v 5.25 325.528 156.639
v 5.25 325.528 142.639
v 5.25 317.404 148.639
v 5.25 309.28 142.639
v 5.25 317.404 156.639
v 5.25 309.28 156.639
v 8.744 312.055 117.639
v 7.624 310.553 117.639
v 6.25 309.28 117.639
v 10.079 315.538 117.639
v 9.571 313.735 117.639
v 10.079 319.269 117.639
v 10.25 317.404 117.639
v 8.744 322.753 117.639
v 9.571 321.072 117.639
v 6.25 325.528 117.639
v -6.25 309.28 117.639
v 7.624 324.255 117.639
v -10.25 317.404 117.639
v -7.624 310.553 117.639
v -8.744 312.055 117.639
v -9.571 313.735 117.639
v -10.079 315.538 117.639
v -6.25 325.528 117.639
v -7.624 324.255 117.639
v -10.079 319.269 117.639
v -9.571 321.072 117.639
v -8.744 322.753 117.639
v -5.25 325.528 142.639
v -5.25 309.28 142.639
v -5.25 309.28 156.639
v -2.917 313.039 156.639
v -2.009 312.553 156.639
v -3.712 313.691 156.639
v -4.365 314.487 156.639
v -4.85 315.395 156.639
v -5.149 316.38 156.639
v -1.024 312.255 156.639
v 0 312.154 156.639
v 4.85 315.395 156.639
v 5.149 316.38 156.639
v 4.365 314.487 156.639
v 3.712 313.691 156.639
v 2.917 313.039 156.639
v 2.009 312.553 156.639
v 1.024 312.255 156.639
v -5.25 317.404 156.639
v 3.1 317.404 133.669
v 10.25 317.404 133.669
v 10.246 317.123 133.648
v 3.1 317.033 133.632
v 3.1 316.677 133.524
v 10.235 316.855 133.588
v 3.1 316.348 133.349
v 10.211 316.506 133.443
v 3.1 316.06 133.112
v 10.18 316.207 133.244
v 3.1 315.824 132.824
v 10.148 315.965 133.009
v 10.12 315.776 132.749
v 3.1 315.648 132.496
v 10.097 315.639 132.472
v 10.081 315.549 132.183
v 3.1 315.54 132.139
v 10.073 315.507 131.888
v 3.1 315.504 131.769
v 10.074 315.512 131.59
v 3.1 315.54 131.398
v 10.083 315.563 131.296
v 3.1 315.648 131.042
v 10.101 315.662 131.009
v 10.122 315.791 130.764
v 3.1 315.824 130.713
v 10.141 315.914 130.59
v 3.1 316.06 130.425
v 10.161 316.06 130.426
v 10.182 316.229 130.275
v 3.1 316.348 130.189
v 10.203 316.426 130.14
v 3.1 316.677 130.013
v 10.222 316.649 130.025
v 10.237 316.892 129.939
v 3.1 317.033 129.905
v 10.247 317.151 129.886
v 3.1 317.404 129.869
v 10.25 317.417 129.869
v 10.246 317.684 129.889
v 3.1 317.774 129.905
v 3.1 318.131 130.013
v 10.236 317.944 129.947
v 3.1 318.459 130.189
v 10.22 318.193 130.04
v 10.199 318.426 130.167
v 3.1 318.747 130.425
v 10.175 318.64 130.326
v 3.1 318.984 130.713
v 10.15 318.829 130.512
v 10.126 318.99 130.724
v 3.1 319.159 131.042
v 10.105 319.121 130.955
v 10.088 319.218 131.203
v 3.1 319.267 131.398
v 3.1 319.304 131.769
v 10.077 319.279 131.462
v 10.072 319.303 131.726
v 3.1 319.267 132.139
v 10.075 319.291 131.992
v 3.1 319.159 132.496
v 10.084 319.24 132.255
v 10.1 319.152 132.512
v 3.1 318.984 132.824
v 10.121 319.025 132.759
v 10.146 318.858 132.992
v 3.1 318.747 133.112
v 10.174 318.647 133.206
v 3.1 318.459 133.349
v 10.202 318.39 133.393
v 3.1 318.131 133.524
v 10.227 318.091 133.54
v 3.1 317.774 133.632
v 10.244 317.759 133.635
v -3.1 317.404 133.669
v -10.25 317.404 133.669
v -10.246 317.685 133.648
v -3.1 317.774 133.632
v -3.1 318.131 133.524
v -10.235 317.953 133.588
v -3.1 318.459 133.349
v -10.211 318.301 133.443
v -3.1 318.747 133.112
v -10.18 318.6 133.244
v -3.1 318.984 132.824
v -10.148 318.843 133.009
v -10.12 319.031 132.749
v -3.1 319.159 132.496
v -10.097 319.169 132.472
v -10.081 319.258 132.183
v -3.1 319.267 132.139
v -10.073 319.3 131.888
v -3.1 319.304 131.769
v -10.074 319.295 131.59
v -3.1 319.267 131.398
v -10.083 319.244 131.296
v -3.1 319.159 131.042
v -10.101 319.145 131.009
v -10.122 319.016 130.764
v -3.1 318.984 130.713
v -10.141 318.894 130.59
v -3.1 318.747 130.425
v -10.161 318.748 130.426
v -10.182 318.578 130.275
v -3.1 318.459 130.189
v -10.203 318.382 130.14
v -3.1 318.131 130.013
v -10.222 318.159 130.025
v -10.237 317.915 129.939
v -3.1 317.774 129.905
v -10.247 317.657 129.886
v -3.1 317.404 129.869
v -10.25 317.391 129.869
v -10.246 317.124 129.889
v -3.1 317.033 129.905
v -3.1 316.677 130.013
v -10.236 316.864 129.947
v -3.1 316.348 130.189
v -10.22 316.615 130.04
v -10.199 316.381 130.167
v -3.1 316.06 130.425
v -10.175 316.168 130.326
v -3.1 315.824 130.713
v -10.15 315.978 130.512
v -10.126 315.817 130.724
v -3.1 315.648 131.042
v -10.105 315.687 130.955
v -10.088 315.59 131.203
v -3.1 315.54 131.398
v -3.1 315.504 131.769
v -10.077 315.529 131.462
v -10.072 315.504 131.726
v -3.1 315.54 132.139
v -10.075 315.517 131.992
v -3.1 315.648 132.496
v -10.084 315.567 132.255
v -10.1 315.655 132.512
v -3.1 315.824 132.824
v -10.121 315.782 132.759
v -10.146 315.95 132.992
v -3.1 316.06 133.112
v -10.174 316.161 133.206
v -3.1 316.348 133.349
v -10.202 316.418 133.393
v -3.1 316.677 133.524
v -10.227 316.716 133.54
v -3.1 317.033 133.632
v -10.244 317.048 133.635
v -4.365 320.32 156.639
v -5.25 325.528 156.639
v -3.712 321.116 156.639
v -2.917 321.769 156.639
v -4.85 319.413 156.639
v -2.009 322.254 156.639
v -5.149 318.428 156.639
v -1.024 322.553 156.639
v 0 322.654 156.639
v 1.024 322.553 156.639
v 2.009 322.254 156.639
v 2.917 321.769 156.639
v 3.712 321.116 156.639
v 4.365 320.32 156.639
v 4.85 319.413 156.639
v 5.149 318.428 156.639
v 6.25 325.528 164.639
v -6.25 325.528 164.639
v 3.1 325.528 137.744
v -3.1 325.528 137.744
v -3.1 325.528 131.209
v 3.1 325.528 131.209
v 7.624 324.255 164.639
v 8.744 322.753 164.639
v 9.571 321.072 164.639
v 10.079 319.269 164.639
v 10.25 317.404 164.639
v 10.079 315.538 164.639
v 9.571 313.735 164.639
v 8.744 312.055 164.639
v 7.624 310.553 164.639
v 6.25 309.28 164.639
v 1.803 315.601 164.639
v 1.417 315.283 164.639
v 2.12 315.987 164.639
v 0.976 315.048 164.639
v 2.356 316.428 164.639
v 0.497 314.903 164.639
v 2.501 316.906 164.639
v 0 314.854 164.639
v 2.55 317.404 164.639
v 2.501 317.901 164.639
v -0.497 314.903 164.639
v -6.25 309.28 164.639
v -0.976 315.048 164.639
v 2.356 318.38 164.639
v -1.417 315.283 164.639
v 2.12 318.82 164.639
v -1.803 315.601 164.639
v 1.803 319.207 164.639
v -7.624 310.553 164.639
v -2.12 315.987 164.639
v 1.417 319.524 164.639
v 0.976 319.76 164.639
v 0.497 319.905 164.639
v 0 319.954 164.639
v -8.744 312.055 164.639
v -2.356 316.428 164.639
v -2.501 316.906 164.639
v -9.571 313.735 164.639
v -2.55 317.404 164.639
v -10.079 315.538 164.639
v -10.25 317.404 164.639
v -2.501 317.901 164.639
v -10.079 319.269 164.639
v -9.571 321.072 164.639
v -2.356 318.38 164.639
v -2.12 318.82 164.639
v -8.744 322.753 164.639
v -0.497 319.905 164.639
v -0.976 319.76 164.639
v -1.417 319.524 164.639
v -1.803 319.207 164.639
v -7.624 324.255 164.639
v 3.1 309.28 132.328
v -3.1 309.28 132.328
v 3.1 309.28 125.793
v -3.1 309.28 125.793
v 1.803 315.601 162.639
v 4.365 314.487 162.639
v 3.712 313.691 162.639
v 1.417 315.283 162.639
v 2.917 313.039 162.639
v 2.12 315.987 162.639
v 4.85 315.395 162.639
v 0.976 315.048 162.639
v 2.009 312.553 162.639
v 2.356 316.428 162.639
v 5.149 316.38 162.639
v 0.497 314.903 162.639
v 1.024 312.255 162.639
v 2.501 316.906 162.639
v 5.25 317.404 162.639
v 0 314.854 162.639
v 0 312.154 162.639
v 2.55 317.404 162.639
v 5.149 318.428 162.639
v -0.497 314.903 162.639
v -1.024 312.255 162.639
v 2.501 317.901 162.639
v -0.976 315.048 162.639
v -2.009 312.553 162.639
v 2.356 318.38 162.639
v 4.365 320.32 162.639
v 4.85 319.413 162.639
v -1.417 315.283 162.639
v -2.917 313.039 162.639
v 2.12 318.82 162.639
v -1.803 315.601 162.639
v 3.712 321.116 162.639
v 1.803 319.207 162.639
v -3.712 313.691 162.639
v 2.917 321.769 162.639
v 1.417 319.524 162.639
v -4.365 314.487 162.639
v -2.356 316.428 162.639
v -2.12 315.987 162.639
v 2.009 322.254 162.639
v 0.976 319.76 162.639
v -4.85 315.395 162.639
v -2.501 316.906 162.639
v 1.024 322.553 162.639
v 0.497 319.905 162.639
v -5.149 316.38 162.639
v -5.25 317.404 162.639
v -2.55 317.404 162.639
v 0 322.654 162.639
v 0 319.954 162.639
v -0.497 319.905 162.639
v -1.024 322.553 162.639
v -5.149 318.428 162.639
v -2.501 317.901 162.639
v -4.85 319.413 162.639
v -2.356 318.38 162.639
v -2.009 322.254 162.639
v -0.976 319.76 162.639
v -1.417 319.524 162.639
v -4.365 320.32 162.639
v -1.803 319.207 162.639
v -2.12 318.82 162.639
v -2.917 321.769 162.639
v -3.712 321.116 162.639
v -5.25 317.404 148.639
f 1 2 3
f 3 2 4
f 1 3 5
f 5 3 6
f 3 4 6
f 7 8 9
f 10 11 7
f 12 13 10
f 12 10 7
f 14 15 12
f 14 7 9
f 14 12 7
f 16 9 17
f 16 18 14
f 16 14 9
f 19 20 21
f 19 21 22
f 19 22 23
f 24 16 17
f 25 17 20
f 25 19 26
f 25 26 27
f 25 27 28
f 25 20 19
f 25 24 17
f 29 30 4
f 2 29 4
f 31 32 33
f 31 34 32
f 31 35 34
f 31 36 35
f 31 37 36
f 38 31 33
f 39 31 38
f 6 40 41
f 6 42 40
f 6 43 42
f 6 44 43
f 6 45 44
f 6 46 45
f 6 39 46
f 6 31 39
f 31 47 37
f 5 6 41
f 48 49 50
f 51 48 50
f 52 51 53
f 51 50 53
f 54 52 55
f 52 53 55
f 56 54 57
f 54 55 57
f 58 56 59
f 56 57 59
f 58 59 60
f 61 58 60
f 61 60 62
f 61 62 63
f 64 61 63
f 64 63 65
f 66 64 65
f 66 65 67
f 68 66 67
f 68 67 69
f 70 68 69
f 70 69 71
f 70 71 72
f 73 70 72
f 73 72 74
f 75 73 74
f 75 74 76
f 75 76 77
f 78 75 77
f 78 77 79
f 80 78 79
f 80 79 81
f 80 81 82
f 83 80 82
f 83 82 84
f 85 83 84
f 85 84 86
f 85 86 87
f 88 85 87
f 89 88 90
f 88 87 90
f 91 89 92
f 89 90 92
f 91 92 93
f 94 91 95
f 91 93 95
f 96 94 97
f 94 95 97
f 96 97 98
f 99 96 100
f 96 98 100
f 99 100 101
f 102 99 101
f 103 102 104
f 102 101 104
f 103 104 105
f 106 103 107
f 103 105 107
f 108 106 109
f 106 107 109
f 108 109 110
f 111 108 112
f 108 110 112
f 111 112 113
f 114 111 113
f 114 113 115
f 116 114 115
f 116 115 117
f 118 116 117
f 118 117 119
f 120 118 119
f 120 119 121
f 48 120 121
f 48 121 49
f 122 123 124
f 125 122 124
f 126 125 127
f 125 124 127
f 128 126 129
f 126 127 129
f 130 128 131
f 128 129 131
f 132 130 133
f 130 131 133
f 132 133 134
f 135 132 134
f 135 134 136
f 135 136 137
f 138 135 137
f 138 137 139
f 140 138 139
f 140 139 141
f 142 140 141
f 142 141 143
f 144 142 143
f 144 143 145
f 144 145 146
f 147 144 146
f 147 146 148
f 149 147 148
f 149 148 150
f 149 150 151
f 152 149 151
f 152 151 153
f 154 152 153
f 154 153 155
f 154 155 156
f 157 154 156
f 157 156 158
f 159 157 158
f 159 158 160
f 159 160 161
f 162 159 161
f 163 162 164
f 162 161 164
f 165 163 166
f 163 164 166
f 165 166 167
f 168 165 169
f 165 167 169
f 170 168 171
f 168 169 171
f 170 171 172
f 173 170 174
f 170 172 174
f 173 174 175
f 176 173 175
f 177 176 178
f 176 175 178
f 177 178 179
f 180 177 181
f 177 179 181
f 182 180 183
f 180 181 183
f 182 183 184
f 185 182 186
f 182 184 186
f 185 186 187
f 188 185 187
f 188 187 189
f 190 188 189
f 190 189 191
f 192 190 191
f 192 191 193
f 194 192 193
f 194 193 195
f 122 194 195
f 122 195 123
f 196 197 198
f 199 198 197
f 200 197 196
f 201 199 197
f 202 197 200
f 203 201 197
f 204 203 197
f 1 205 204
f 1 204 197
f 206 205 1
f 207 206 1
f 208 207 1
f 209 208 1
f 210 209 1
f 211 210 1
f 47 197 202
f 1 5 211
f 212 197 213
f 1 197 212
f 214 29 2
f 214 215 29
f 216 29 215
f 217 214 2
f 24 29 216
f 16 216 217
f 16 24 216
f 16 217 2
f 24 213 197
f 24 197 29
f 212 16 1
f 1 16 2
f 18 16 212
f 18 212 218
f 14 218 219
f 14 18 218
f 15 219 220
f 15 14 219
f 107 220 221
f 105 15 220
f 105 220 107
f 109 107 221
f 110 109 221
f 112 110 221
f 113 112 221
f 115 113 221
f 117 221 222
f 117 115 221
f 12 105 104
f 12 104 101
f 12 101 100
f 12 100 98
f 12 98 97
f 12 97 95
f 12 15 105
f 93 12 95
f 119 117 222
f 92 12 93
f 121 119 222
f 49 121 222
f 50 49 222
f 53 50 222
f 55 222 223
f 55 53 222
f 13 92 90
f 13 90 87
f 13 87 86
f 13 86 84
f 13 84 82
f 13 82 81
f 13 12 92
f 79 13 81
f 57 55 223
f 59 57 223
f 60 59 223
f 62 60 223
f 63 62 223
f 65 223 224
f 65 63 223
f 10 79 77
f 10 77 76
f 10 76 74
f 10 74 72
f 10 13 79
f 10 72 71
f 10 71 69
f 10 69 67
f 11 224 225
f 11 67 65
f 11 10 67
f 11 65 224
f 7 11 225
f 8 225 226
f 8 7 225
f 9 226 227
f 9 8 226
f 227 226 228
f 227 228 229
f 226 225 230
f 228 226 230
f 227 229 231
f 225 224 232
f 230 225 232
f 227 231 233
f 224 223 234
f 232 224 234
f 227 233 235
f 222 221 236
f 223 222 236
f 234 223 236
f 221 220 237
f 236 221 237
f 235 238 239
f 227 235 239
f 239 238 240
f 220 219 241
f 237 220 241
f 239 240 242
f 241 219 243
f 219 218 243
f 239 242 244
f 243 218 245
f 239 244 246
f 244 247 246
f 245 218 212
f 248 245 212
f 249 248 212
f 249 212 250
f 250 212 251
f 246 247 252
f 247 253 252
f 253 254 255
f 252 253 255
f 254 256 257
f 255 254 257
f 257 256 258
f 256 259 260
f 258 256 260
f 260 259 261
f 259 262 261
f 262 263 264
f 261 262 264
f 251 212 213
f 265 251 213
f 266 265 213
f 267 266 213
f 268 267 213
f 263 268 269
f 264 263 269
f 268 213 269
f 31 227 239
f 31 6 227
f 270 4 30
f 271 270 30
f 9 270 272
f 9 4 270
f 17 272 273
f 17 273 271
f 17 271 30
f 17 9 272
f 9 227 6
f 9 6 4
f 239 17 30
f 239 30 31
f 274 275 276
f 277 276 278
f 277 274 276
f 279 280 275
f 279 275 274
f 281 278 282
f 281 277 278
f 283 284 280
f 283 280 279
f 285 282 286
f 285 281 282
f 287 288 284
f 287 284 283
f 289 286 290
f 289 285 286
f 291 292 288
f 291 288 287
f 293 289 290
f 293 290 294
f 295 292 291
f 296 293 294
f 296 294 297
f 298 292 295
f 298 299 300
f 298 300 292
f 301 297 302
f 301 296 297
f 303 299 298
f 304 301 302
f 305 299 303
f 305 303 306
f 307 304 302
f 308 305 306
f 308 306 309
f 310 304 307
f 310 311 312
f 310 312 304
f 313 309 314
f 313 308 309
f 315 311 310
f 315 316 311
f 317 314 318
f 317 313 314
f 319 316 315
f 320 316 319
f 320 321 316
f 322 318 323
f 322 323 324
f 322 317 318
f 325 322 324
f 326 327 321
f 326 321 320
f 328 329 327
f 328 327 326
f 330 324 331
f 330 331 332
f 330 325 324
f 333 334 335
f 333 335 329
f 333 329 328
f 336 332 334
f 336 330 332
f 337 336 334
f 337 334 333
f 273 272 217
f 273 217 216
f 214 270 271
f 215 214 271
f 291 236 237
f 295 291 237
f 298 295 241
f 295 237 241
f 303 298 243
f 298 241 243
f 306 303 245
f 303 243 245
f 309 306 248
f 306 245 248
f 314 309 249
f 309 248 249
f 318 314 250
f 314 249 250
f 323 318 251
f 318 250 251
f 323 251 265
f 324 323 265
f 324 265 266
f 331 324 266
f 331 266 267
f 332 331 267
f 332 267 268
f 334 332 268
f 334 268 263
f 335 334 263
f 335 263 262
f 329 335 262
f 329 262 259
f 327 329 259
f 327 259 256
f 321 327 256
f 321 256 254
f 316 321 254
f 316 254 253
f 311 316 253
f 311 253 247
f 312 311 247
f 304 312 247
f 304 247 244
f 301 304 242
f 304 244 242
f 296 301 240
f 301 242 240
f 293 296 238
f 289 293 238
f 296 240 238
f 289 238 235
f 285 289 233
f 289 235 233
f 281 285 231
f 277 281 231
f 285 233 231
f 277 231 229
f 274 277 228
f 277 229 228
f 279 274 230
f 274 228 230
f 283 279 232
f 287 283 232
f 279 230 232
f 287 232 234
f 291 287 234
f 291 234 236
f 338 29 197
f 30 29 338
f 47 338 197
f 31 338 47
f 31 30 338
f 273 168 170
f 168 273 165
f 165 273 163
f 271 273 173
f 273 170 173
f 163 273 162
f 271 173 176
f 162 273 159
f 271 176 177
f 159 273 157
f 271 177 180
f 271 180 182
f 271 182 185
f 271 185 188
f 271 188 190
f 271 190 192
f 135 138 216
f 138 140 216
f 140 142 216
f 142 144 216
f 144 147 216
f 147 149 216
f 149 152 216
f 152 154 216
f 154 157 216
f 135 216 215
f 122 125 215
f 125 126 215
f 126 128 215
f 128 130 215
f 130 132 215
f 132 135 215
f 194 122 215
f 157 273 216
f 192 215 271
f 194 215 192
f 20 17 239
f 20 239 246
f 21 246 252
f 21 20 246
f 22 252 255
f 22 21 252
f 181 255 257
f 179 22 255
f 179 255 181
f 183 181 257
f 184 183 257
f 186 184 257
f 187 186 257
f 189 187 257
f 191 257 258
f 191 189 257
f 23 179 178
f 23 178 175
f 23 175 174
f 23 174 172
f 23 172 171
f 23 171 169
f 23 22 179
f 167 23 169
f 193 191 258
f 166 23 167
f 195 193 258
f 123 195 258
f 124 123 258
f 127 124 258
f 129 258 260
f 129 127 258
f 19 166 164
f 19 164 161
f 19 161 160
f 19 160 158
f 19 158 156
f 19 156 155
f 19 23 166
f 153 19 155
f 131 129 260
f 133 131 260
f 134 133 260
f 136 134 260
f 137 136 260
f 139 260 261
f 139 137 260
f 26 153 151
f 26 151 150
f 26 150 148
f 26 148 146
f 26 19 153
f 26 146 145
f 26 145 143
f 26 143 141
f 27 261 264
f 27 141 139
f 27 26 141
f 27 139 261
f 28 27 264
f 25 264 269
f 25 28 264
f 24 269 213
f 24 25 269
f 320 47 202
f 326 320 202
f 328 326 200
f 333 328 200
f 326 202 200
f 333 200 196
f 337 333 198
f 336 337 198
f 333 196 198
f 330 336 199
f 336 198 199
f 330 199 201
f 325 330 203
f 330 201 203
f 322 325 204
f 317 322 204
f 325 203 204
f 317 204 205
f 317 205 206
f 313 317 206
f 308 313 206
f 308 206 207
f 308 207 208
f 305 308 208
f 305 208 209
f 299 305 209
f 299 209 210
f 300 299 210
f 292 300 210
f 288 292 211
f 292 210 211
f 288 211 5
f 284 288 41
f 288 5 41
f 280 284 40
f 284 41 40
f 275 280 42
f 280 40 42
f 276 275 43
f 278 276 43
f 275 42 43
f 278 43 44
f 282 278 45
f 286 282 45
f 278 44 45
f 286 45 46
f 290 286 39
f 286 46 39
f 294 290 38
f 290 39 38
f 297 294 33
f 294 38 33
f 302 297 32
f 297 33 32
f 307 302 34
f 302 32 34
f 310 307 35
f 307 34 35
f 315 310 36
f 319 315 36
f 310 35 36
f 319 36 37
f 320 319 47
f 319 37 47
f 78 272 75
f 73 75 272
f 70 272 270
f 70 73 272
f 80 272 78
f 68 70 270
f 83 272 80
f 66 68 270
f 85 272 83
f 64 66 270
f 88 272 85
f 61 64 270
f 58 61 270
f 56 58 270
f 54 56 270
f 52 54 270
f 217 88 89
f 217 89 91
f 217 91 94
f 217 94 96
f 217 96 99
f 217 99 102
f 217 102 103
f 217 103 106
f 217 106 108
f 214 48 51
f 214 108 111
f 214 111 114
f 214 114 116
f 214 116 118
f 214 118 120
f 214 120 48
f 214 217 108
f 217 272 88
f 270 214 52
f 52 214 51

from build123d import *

# Parameters (mm, degrees)
SALIENTE_EXTRUIR1_DEPTH             = 47
CROQUIS2_W                          = 6.2
CROQUIS2_H                          = 6.535373831
CORTAR_EXTRUIR1_DEPTH               = 17.248076809
CROQUIS3_W                          = 10.5
CROQUIS3_H                          = 14
CORTAR_EXTRUIR2_DEPTH               = 17.248076809
NGULO_DE_SALIDA1_ANGLE              = 18.434948823
NGULO_DE_SALIDA2_ANGLE              = -18.434948823
TALADRO1_D                          = 5.1
TALADRO1_DEPTH                      = 8
TALADRO1_CBORE_D                    = 10.5
TALADRO1_CBORE_DEPTH                = 6
CROQUIS6_W                          = 1.9
CROQUIS6_H                          = 7.15
DI_METRO_DE_TALADRO_3_8_3_8_2_D     = 3.8
DI_METRO_DE_TALADRO_3_8_3_8_2_DEPTH = 7.15


with BuildPart() as part:
    # Croquis1 → Saliente-Extruir1 (new body)
    with BuildSketch(Plane(origin=(0, 0, 117.639), x_dir=(-1, 0, 0), z_dir=(0, 0, -1))):
        with BuildLine():
            Line((-6.25, 309.279690095), (6.25, 309.279690095))
            ThreePointArc((6.25, 309.279690095), (10.25, 317.403728499), (6.25, 325.527766904))
            Line((6.25, 325.527766904), (-6.25, 325.527766904))
            ThreePointArc((-6.25, 325.527766904), (-10.25, 317.403728499), (-6.25, 309.279690095))
        make_face()
    extrude(amount=-SALIENTE_EXTRUIR1_DEPTH)

    # Croquis2 → Cortar-Extruir1 (cut, through all)
    with BuildSketch(Plane(origin=(0, 325.527766904, 0), x_dir=(-1, 0, 0), z_dir=(0, 1, 0))):
        with Locations((0, 129.060696737)):
            Rectangle(CROQUIS2_W, CROQUIS2_H)
    extrude(amount=-CORTAR_EXTRUIR1_DEPTH, mode=Mode.SUBTRACT)

    # Croquis3 → Cortar-Extruir2 (cut, through all)
    with BuildSketch(Plane.XZ.offset(-309.279690095)):
        with Locations((0, 149.639)):
            Rectangle(CROQUIS3_W, CROQUIS3_H)
    extrude(amount=-CORTAR_EXTRUIR2_DEPTH, mode=Mode.SUBTRACT)

    # Ángulo de salida1
    ngulo_de_salida1_faces = [part.faces().sort_by_distance(p)[0] for p in [
        (0, 317.403728499, 125.793009821),
    ]]
    draft(ngulo_de_salida1_faces, Plane(origin=(6.25, 309.279690095, 164.639), x_dir=(0, 0, -1), z_dir=(0, -1, 0)), NGULO_DE_SALIDA1_ANGLE)

    # Ángulo de salida2
    ngulo_de_salida2_faces = [part.faces().sort_by_distance(p)[0] for p in [
        (0, 317.403728499, 132.328383652),
    ]]
    draft(ngulo_de_salida2_faces, Plane(origin=(6.25, 309.279690095, 164.639), x_dir=(0, 0, -1), z_dir=(0, -1, 0)), NGULO_DE_SALIDA2_ANGLE)

    # Taladro1
    with Locations(Plane(origin=(0, 0, 156.639), x_dir=(-1, 0, 0), z_dir=(0, 0, -1))):
        with Locations((0, 317.403728499)):
            CounterBoreHole(TALADRO1_D / 2, TALADRO1_CBORE_D / 2, TALADRO1_CBORE_DEPTH, depth=TALADRO1_DEPTH)

    # Croquis6 → Diámetro de taladro Ø3.8 (3.8)1 (revolve, cut)
    with BuildSketch(Plane(origin=(3.1, 317.403728499, 131.768709538), x_dir=(0, 0, 1), z_dir=(0, 1, 0))):
        with Locations((0.95, 3.575)):
            Rectangle(CROQUIS6_W, CROQUIS6_H)
    revolve(axis=Axis((-3.25, 317.403728499, 131.768709538), (1, 0, 0)), mode=Mode.SUBTRACT)

    # Diámetro de taladro Ø3.8 (3.8)2
    with Locations(Plane(origin=(-3.1, 0, 0), x_dir=(0, 0, -1), z_dir=(1, 0, 0))):
        with Locations((-131.768709538, 317.403728499)):
            Hole(DI_METRO_DE_TALADRO_3_8_3_8_2_D / 2, depth=DI_METRO_DE_TALADRO_3_8_3_8_2_DEPTH)


solid = part.part
